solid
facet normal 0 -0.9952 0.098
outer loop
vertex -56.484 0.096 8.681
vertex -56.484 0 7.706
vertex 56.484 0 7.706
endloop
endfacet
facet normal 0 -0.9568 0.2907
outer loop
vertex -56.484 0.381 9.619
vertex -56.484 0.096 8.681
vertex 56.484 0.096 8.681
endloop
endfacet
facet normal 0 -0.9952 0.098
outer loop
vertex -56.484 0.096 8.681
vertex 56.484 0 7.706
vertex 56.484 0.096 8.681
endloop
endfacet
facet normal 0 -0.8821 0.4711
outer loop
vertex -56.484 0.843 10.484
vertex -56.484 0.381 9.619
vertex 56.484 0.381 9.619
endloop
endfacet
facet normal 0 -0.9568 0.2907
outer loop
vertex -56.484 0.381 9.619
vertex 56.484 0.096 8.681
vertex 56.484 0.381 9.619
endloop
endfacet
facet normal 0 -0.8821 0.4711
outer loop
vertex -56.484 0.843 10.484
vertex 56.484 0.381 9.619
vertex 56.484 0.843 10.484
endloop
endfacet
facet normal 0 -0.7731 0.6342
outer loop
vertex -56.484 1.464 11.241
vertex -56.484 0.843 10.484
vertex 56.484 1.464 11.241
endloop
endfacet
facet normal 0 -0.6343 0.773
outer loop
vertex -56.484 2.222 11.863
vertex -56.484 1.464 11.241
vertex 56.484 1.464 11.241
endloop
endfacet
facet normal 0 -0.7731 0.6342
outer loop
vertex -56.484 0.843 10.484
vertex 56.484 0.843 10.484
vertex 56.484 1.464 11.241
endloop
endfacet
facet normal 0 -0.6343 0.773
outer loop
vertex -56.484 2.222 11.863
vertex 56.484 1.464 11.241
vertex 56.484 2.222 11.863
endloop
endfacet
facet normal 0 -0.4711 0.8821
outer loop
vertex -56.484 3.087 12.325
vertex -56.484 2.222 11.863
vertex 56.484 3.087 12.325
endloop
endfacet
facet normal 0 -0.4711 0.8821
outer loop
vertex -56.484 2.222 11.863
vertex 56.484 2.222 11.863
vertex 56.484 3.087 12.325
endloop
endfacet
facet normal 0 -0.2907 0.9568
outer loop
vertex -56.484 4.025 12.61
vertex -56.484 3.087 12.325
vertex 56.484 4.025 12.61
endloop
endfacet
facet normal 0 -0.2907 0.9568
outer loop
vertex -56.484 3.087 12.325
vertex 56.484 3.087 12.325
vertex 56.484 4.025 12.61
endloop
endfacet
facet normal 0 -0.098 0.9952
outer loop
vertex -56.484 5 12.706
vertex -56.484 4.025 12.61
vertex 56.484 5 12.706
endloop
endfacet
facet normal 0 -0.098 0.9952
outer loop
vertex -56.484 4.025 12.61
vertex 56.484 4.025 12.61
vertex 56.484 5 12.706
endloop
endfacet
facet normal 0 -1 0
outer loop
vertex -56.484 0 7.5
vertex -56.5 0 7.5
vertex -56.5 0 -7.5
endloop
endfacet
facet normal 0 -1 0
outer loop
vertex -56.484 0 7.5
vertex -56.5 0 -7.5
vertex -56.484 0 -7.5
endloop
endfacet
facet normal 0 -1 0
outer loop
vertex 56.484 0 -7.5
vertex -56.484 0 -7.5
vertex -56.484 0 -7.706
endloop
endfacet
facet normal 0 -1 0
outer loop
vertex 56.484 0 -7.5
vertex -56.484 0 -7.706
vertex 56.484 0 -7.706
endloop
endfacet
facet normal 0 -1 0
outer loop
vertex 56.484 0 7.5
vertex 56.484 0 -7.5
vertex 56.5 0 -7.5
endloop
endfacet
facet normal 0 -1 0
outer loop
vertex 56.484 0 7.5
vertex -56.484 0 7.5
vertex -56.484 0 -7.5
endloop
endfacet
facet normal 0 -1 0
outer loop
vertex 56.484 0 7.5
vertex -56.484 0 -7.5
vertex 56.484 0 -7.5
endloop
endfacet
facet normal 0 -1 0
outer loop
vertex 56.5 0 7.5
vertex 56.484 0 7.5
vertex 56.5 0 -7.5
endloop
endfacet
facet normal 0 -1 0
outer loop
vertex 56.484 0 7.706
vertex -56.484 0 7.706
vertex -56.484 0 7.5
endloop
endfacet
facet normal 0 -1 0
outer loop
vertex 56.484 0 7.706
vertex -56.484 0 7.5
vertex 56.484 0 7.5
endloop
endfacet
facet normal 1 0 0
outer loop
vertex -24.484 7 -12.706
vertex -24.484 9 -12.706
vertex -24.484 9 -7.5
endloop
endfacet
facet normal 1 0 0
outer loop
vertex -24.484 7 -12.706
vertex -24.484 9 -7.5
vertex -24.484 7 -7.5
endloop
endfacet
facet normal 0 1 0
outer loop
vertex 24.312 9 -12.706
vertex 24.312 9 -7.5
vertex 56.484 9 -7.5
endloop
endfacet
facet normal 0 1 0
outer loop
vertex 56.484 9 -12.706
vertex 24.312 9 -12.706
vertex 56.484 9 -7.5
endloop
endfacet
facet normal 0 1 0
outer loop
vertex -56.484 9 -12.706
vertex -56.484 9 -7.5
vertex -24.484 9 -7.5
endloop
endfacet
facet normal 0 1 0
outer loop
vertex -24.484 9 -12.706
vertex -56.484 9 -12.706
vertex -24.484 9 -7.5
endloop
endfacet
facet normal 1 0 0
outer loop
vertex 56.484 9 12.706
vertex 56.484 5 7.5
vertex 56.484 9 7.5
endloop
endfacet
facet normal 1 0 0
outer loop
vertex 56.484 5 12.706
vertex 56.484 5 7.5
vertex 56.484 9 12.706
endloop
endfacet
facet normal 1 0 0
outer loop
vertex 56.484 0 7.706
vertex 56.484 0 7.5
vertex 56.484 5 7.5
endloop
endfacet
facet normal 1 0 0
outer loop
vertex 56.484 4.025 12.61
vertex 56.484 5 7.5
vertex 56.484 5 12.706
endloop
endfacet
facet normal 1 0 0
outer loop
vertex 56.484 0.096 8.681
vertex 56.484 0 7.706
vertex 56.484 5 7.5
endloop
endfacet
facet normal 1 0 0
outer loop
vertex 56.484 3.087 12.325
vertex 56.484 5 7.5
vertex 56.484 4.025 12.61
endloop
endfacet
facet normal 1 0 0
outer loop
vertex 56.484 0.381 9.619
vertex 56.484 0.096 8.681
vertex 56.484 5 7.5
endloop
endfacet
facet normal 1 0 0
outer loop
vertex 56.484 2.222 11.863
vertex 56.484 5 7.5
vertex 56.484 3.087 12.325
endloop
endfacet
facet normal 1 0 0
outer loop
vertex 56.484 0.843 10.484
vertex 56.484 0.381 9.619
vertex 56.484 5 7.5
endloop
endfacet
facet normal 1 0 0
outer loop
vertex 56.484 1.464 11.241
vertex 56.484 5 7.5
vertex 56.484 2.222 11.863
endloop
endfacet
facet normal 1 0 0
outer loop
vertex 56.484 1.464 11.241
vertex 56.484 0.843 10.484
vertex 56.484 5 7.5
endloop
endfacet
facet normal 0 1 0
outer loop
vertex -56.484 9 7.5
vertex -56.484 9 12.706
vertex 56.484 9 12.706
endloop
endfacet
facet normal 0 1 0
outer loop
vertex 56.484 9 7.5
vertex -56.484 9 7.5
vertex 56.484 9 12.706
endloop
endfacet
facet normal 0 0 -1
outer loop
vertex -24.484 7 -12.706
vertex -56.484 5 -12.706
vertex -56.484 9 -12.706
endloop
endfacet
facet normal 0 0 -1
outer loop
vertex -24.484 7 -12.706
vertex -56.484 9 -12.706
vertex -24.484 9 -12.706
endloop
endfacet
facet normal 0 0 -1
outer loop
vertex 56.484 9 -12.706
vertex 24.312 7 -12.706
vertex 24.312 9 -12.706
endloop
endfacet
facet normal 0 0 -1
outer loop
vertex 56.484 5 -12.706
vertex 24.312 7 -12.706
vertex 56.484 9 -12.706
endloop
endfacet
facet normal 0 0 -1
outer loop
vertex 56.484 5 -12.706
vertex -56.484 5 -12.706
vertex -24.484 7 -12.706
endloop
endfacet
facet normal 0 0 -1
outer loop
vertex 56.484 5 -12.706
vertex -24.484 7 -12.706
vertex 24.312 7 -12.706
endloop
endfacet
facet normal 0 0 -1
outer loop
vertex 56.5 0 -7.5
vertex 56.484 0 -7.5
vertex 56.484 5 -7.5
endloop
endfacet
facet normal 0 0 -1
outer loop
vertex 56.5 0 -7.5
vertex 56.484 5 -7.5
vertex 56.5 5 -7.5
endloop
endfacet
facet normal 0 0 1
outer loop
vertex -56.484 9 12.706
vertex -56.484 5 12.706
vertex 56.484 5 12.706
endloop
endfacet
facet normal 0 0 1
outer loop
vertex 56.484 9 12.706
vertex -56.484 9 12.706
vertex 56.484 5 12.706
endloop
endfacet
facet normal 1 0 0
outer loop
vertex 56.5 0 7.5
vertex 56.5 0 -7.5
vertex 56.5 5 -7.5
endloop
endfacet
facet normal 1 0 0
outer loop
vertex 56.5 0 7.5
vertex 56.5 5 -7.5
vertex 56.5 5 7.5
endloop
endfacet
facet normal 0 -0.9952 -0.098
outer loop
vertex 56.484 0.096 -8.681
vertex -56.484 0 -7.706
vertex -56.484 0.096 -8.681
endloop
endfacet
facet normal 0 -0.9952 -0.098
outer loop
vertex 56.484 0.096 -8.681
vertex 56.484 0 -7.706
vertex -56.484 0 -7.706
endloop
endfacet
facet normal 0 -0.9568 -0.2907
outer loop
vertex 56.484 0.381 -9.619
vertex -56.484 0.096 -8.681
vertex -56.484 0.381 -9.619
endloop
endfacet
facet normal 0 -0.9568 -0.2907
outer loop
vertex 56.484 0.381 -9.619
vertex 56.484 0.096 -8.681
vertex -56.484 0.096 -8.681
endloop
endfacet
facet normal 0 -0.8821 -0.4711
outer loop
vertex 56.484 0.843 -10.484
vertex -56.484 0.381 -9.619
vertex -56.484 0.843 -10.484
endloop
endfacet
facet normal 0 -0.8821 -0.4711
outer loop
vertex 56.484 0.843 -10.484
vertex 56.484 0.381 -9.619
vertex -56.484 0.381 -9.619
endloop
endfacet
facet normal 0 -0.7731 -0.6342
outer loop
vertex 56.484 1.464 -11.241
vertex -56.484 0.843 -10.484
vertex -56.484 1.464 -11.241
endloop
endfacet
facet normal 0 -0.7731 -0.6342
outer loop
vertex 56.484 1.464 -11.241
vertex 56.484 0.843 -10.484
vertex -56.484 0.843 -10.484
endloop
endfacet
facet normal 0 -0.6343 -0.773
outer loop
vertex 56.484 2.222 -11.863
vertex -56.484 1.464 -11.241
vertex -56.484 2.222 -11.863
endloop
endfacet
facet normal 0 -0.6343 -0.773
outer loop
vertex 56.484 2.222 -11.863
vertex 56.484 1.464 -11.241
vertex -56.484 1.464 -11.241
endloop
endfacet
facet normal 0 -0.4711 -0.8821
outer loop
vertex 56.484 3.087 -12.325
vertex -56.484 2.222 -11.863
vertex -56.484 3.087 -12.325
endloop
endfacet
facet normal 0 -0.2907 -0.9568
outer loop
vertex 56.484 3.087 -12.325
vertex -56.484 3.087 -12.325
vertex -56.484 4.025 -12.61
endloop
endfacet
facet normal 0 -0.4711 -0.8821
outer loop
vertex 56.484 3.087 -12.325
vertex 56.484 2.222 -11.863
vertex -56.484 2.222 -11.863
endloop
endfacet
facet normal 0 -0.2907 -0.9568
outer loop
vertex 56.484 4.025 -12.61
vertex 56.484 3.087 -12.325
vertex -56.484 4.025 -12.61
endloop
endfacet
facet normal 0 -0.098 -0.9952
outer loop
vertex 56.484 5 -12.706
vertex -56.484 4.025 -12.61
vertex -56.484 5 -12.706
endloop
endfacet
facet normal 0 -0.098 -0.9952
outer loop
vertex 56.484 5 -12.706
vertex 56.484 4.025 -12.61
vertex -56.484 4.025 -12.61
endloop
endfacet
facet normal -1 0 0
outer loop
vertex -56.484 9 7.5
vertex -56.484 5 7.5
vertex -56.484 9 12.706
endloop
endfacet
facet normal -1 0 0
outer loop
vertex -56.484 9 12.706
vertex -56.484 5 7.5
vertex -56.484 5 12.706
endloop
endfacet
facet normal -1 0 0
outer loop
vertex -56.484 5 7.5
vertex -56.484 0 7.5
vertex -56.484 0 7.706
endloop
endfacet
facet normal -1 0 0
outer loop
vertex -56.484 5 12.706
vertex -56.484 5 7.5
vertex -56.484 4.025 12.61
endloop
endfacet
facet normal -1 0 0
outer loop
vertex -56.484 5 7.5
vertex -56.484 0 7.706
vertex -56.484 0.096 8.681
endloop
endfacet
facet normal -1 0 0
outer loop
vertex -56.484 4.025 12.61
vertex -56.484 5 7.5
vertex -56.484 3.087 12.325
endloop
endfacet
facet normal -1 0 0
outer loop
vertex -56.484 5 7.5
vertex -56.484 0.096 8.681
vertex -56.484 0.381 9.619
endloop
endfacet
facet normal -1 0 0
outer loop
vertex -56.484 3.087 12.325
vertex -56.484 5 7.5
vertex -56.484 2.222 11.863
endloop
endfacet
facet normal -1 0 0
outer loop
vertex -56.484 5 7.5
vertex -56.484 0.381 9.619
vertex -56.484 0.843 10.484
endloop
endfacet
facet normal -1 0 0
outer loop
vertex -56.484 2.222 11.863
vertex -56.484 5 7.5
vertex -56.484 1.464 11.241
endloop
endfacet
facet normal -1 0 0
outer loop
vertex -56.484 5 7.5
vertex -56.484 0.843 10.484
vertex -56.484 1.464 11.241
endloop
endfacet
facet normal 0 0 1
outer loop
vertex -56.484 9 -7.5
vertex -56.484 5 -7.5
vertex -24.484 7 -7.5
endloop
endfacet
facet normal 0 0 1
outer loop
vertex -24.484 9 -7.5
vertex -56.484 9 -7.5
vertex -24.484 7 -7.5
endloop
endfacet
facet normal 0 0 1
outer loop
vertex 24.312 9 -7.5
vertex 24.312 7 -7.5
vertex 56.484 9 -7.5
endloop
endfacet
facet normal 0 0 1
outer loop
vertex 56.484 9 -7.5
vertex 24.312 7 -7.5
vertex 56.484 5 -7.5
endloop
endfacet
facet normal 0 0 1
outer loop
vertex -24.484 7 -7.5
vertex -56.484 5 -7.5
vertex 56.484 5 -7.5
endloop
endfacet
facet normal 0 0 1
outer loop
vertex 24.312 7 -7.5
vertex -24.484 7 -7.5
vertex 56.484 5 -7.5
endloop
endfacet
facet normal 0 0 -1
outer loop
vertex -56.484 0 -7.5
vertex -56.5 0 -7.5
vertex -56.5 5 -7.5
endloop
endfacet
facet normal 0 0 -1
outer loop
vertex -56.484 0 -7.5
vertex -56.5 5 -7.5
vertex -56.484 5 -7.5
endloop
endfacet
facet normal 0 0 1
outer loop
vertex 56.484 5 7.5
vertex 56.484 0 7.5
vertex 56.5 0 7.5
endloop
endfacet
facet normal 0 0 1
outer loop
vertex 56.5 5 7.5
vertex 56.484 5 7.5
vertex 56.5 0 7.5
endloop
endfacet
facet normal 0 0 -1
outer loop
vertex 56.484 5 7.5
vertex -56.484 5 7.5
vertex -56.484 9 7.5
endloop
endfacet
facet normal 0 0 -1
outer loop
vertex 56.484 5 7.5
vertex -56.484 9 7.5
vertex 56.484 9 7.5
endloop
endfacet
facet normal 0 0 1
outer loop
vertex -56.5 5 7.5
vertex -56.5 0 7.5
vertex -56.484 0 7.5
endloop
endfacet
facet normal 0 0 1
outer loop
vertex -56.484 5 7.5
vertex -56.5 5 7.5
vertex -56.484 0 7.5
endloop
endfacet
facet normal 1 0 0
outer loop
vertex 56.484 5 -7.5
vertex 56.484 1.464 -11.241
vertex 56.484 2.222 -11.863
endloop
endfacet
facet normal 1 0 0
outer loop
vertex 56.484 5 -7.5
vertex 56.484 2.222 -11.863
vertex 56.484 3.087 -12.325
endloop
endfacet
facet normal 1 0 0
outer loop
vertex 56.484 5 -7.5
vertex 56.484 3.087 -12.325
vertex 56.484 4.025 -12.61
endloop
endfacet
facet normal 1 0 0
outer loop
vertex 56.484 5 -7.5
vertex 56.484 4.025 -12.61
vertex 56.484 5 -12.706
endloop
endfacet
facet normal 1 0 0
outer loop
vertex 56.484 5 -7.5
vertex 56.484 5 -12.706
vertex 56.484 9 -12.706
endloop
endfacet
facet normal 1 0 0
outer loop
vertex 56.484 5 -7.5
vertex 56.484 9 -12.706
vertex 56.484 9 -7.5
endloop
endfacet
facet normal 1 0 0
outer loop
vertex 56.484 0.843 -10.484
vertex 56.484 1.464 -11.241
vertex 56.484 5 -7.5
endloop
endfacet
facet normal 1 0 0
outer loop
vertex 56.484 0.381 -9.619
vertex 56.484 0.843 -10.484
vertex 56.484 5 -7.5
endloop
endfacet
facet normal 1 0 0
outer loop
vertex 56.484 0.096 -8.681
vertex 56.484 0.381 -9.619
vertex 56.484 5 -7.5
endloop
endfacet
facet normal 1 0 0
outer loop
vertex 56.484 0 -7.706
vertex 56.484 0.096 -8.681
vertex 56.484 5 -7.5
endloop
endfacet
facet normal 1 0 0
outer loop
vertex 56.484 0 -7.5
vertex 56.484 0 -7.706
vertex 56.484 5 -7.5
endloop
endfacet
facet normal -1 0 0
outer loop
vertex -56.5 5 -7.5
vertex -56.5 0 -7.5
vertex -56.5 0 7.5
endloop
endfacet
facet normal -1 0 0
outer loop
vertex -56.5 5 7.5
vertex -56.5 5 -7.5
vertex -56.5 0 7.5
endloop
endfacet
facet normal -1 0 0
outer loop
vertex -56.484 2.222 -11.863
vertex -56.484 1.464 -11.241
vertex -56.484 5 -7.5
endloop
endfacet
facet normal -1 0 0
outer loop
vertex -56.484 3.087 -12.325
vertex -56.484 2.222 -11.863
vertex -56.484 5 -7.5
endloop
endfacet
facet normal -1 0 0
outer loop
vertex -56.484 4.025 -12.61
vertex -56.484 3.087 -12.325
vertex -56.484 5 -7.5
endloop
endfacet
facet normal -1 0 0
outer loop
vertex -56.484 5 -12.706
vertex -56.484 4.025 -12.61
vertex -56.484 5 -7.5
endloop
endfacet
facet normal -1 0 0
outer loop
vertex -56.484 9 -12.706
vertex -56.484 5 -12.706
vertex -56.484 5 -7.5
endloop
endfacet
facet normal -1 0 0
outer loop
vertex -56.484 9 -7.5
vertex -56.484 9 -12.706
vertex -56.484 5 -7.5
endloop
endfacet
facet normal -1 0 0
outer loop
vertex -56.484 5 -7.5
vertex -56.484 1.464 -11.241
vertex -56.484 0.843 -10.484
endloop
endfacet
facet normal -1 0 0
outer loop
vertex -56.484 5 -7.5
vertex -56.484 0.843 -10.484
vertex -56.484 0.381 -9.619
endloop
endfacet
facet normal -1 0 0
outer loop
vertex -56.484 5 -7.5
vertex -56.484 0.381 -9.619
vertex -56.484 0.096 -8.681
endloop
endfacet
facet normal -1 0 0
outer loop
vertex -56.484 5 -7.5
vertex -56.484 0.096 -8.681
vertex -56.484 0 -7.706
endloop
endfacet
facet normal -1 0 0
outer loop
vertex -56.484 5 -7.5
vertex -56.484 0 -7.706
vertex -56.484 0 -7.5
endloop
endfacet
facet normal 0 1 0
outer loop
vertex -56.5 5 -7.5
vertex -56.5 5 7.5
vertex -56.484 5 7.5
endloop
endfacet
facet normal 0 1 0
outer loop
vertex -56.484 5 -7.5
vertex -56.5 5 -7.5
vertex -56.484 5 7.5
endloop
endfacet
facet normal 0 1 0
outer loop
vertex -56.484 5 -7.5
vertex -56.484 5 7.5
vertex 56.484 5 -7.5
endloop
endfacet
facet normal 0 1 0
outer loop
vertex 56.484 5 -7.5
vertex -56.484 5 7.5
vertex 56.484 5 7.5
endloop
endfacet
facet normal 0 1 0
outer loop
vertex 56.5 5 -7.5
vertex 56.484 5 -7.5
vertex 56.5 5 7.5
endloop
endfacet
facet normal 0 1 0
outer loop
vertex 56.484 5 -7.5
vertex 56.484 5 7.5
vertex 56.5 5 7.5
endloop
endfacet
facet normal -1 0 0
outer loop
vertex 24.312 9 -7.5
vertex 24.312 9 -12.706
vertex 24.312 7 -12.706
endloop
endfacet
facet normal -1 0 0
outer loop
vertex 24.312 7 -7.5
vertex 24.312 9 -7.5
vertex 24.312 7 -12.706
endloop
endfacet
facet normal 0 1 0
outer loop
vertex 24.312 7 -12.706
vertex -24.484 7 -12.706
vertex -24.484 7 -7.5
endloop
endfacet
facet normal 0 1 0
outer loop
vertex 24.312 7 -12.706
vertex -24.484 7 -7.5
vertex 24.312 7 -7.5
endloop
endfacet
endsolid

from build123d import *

# Parameters (mm, degrees)
F0_W     = 113
F0_H     = 15
F1_DEPTH = 5
F2_W     = 112.967252
F2_H     = 5.205671
F3_DEPTH = 9
F4_R     = 5
F5_W     = 48.795211
F5_H     = 2
F6_DEPTH = 10


with BuildPart() as f1:
    # F0 (on Front) → F1 (new body)
    with BuildSketch(Plane.XZ):
        Rectangle(F0_W, F0_H)
    extrude(amount=-F1_DEPTH)

    # F2 (on face) → F3 (join)
    with BuildSketch(Plane.XZ):
        with Locations((0, 10.102835)):
            Rectangle(F2_W, F2_H)
        with Locations((0, -10.102835)):
            Rectangle(F2_W, F2_H)
    extrude(amount=-F3_DEPTH)

    # F4
    f4_edges = [f1.edges().sort_by_distance(p)[0] for p in [
        (0, 0, 12.705671),
        (0, 0, -12.705671),
    ]]
    fillet(f4_edges, radius=F4_R)

    # F5 (on face) → F6 (cut)
    with BuildSketch(Plane(origin=(0, 0, -12.705671), x_dir=(1, 0, 0), z_dir=(0, 0, -1))):
        with Locations((-0.086021, -8)):
            Rectangle(F5_W, F5_H)
    extrude(amount=-F6_DEPTH, mode=Mode.SUBTRACT)


solid = f1.part
